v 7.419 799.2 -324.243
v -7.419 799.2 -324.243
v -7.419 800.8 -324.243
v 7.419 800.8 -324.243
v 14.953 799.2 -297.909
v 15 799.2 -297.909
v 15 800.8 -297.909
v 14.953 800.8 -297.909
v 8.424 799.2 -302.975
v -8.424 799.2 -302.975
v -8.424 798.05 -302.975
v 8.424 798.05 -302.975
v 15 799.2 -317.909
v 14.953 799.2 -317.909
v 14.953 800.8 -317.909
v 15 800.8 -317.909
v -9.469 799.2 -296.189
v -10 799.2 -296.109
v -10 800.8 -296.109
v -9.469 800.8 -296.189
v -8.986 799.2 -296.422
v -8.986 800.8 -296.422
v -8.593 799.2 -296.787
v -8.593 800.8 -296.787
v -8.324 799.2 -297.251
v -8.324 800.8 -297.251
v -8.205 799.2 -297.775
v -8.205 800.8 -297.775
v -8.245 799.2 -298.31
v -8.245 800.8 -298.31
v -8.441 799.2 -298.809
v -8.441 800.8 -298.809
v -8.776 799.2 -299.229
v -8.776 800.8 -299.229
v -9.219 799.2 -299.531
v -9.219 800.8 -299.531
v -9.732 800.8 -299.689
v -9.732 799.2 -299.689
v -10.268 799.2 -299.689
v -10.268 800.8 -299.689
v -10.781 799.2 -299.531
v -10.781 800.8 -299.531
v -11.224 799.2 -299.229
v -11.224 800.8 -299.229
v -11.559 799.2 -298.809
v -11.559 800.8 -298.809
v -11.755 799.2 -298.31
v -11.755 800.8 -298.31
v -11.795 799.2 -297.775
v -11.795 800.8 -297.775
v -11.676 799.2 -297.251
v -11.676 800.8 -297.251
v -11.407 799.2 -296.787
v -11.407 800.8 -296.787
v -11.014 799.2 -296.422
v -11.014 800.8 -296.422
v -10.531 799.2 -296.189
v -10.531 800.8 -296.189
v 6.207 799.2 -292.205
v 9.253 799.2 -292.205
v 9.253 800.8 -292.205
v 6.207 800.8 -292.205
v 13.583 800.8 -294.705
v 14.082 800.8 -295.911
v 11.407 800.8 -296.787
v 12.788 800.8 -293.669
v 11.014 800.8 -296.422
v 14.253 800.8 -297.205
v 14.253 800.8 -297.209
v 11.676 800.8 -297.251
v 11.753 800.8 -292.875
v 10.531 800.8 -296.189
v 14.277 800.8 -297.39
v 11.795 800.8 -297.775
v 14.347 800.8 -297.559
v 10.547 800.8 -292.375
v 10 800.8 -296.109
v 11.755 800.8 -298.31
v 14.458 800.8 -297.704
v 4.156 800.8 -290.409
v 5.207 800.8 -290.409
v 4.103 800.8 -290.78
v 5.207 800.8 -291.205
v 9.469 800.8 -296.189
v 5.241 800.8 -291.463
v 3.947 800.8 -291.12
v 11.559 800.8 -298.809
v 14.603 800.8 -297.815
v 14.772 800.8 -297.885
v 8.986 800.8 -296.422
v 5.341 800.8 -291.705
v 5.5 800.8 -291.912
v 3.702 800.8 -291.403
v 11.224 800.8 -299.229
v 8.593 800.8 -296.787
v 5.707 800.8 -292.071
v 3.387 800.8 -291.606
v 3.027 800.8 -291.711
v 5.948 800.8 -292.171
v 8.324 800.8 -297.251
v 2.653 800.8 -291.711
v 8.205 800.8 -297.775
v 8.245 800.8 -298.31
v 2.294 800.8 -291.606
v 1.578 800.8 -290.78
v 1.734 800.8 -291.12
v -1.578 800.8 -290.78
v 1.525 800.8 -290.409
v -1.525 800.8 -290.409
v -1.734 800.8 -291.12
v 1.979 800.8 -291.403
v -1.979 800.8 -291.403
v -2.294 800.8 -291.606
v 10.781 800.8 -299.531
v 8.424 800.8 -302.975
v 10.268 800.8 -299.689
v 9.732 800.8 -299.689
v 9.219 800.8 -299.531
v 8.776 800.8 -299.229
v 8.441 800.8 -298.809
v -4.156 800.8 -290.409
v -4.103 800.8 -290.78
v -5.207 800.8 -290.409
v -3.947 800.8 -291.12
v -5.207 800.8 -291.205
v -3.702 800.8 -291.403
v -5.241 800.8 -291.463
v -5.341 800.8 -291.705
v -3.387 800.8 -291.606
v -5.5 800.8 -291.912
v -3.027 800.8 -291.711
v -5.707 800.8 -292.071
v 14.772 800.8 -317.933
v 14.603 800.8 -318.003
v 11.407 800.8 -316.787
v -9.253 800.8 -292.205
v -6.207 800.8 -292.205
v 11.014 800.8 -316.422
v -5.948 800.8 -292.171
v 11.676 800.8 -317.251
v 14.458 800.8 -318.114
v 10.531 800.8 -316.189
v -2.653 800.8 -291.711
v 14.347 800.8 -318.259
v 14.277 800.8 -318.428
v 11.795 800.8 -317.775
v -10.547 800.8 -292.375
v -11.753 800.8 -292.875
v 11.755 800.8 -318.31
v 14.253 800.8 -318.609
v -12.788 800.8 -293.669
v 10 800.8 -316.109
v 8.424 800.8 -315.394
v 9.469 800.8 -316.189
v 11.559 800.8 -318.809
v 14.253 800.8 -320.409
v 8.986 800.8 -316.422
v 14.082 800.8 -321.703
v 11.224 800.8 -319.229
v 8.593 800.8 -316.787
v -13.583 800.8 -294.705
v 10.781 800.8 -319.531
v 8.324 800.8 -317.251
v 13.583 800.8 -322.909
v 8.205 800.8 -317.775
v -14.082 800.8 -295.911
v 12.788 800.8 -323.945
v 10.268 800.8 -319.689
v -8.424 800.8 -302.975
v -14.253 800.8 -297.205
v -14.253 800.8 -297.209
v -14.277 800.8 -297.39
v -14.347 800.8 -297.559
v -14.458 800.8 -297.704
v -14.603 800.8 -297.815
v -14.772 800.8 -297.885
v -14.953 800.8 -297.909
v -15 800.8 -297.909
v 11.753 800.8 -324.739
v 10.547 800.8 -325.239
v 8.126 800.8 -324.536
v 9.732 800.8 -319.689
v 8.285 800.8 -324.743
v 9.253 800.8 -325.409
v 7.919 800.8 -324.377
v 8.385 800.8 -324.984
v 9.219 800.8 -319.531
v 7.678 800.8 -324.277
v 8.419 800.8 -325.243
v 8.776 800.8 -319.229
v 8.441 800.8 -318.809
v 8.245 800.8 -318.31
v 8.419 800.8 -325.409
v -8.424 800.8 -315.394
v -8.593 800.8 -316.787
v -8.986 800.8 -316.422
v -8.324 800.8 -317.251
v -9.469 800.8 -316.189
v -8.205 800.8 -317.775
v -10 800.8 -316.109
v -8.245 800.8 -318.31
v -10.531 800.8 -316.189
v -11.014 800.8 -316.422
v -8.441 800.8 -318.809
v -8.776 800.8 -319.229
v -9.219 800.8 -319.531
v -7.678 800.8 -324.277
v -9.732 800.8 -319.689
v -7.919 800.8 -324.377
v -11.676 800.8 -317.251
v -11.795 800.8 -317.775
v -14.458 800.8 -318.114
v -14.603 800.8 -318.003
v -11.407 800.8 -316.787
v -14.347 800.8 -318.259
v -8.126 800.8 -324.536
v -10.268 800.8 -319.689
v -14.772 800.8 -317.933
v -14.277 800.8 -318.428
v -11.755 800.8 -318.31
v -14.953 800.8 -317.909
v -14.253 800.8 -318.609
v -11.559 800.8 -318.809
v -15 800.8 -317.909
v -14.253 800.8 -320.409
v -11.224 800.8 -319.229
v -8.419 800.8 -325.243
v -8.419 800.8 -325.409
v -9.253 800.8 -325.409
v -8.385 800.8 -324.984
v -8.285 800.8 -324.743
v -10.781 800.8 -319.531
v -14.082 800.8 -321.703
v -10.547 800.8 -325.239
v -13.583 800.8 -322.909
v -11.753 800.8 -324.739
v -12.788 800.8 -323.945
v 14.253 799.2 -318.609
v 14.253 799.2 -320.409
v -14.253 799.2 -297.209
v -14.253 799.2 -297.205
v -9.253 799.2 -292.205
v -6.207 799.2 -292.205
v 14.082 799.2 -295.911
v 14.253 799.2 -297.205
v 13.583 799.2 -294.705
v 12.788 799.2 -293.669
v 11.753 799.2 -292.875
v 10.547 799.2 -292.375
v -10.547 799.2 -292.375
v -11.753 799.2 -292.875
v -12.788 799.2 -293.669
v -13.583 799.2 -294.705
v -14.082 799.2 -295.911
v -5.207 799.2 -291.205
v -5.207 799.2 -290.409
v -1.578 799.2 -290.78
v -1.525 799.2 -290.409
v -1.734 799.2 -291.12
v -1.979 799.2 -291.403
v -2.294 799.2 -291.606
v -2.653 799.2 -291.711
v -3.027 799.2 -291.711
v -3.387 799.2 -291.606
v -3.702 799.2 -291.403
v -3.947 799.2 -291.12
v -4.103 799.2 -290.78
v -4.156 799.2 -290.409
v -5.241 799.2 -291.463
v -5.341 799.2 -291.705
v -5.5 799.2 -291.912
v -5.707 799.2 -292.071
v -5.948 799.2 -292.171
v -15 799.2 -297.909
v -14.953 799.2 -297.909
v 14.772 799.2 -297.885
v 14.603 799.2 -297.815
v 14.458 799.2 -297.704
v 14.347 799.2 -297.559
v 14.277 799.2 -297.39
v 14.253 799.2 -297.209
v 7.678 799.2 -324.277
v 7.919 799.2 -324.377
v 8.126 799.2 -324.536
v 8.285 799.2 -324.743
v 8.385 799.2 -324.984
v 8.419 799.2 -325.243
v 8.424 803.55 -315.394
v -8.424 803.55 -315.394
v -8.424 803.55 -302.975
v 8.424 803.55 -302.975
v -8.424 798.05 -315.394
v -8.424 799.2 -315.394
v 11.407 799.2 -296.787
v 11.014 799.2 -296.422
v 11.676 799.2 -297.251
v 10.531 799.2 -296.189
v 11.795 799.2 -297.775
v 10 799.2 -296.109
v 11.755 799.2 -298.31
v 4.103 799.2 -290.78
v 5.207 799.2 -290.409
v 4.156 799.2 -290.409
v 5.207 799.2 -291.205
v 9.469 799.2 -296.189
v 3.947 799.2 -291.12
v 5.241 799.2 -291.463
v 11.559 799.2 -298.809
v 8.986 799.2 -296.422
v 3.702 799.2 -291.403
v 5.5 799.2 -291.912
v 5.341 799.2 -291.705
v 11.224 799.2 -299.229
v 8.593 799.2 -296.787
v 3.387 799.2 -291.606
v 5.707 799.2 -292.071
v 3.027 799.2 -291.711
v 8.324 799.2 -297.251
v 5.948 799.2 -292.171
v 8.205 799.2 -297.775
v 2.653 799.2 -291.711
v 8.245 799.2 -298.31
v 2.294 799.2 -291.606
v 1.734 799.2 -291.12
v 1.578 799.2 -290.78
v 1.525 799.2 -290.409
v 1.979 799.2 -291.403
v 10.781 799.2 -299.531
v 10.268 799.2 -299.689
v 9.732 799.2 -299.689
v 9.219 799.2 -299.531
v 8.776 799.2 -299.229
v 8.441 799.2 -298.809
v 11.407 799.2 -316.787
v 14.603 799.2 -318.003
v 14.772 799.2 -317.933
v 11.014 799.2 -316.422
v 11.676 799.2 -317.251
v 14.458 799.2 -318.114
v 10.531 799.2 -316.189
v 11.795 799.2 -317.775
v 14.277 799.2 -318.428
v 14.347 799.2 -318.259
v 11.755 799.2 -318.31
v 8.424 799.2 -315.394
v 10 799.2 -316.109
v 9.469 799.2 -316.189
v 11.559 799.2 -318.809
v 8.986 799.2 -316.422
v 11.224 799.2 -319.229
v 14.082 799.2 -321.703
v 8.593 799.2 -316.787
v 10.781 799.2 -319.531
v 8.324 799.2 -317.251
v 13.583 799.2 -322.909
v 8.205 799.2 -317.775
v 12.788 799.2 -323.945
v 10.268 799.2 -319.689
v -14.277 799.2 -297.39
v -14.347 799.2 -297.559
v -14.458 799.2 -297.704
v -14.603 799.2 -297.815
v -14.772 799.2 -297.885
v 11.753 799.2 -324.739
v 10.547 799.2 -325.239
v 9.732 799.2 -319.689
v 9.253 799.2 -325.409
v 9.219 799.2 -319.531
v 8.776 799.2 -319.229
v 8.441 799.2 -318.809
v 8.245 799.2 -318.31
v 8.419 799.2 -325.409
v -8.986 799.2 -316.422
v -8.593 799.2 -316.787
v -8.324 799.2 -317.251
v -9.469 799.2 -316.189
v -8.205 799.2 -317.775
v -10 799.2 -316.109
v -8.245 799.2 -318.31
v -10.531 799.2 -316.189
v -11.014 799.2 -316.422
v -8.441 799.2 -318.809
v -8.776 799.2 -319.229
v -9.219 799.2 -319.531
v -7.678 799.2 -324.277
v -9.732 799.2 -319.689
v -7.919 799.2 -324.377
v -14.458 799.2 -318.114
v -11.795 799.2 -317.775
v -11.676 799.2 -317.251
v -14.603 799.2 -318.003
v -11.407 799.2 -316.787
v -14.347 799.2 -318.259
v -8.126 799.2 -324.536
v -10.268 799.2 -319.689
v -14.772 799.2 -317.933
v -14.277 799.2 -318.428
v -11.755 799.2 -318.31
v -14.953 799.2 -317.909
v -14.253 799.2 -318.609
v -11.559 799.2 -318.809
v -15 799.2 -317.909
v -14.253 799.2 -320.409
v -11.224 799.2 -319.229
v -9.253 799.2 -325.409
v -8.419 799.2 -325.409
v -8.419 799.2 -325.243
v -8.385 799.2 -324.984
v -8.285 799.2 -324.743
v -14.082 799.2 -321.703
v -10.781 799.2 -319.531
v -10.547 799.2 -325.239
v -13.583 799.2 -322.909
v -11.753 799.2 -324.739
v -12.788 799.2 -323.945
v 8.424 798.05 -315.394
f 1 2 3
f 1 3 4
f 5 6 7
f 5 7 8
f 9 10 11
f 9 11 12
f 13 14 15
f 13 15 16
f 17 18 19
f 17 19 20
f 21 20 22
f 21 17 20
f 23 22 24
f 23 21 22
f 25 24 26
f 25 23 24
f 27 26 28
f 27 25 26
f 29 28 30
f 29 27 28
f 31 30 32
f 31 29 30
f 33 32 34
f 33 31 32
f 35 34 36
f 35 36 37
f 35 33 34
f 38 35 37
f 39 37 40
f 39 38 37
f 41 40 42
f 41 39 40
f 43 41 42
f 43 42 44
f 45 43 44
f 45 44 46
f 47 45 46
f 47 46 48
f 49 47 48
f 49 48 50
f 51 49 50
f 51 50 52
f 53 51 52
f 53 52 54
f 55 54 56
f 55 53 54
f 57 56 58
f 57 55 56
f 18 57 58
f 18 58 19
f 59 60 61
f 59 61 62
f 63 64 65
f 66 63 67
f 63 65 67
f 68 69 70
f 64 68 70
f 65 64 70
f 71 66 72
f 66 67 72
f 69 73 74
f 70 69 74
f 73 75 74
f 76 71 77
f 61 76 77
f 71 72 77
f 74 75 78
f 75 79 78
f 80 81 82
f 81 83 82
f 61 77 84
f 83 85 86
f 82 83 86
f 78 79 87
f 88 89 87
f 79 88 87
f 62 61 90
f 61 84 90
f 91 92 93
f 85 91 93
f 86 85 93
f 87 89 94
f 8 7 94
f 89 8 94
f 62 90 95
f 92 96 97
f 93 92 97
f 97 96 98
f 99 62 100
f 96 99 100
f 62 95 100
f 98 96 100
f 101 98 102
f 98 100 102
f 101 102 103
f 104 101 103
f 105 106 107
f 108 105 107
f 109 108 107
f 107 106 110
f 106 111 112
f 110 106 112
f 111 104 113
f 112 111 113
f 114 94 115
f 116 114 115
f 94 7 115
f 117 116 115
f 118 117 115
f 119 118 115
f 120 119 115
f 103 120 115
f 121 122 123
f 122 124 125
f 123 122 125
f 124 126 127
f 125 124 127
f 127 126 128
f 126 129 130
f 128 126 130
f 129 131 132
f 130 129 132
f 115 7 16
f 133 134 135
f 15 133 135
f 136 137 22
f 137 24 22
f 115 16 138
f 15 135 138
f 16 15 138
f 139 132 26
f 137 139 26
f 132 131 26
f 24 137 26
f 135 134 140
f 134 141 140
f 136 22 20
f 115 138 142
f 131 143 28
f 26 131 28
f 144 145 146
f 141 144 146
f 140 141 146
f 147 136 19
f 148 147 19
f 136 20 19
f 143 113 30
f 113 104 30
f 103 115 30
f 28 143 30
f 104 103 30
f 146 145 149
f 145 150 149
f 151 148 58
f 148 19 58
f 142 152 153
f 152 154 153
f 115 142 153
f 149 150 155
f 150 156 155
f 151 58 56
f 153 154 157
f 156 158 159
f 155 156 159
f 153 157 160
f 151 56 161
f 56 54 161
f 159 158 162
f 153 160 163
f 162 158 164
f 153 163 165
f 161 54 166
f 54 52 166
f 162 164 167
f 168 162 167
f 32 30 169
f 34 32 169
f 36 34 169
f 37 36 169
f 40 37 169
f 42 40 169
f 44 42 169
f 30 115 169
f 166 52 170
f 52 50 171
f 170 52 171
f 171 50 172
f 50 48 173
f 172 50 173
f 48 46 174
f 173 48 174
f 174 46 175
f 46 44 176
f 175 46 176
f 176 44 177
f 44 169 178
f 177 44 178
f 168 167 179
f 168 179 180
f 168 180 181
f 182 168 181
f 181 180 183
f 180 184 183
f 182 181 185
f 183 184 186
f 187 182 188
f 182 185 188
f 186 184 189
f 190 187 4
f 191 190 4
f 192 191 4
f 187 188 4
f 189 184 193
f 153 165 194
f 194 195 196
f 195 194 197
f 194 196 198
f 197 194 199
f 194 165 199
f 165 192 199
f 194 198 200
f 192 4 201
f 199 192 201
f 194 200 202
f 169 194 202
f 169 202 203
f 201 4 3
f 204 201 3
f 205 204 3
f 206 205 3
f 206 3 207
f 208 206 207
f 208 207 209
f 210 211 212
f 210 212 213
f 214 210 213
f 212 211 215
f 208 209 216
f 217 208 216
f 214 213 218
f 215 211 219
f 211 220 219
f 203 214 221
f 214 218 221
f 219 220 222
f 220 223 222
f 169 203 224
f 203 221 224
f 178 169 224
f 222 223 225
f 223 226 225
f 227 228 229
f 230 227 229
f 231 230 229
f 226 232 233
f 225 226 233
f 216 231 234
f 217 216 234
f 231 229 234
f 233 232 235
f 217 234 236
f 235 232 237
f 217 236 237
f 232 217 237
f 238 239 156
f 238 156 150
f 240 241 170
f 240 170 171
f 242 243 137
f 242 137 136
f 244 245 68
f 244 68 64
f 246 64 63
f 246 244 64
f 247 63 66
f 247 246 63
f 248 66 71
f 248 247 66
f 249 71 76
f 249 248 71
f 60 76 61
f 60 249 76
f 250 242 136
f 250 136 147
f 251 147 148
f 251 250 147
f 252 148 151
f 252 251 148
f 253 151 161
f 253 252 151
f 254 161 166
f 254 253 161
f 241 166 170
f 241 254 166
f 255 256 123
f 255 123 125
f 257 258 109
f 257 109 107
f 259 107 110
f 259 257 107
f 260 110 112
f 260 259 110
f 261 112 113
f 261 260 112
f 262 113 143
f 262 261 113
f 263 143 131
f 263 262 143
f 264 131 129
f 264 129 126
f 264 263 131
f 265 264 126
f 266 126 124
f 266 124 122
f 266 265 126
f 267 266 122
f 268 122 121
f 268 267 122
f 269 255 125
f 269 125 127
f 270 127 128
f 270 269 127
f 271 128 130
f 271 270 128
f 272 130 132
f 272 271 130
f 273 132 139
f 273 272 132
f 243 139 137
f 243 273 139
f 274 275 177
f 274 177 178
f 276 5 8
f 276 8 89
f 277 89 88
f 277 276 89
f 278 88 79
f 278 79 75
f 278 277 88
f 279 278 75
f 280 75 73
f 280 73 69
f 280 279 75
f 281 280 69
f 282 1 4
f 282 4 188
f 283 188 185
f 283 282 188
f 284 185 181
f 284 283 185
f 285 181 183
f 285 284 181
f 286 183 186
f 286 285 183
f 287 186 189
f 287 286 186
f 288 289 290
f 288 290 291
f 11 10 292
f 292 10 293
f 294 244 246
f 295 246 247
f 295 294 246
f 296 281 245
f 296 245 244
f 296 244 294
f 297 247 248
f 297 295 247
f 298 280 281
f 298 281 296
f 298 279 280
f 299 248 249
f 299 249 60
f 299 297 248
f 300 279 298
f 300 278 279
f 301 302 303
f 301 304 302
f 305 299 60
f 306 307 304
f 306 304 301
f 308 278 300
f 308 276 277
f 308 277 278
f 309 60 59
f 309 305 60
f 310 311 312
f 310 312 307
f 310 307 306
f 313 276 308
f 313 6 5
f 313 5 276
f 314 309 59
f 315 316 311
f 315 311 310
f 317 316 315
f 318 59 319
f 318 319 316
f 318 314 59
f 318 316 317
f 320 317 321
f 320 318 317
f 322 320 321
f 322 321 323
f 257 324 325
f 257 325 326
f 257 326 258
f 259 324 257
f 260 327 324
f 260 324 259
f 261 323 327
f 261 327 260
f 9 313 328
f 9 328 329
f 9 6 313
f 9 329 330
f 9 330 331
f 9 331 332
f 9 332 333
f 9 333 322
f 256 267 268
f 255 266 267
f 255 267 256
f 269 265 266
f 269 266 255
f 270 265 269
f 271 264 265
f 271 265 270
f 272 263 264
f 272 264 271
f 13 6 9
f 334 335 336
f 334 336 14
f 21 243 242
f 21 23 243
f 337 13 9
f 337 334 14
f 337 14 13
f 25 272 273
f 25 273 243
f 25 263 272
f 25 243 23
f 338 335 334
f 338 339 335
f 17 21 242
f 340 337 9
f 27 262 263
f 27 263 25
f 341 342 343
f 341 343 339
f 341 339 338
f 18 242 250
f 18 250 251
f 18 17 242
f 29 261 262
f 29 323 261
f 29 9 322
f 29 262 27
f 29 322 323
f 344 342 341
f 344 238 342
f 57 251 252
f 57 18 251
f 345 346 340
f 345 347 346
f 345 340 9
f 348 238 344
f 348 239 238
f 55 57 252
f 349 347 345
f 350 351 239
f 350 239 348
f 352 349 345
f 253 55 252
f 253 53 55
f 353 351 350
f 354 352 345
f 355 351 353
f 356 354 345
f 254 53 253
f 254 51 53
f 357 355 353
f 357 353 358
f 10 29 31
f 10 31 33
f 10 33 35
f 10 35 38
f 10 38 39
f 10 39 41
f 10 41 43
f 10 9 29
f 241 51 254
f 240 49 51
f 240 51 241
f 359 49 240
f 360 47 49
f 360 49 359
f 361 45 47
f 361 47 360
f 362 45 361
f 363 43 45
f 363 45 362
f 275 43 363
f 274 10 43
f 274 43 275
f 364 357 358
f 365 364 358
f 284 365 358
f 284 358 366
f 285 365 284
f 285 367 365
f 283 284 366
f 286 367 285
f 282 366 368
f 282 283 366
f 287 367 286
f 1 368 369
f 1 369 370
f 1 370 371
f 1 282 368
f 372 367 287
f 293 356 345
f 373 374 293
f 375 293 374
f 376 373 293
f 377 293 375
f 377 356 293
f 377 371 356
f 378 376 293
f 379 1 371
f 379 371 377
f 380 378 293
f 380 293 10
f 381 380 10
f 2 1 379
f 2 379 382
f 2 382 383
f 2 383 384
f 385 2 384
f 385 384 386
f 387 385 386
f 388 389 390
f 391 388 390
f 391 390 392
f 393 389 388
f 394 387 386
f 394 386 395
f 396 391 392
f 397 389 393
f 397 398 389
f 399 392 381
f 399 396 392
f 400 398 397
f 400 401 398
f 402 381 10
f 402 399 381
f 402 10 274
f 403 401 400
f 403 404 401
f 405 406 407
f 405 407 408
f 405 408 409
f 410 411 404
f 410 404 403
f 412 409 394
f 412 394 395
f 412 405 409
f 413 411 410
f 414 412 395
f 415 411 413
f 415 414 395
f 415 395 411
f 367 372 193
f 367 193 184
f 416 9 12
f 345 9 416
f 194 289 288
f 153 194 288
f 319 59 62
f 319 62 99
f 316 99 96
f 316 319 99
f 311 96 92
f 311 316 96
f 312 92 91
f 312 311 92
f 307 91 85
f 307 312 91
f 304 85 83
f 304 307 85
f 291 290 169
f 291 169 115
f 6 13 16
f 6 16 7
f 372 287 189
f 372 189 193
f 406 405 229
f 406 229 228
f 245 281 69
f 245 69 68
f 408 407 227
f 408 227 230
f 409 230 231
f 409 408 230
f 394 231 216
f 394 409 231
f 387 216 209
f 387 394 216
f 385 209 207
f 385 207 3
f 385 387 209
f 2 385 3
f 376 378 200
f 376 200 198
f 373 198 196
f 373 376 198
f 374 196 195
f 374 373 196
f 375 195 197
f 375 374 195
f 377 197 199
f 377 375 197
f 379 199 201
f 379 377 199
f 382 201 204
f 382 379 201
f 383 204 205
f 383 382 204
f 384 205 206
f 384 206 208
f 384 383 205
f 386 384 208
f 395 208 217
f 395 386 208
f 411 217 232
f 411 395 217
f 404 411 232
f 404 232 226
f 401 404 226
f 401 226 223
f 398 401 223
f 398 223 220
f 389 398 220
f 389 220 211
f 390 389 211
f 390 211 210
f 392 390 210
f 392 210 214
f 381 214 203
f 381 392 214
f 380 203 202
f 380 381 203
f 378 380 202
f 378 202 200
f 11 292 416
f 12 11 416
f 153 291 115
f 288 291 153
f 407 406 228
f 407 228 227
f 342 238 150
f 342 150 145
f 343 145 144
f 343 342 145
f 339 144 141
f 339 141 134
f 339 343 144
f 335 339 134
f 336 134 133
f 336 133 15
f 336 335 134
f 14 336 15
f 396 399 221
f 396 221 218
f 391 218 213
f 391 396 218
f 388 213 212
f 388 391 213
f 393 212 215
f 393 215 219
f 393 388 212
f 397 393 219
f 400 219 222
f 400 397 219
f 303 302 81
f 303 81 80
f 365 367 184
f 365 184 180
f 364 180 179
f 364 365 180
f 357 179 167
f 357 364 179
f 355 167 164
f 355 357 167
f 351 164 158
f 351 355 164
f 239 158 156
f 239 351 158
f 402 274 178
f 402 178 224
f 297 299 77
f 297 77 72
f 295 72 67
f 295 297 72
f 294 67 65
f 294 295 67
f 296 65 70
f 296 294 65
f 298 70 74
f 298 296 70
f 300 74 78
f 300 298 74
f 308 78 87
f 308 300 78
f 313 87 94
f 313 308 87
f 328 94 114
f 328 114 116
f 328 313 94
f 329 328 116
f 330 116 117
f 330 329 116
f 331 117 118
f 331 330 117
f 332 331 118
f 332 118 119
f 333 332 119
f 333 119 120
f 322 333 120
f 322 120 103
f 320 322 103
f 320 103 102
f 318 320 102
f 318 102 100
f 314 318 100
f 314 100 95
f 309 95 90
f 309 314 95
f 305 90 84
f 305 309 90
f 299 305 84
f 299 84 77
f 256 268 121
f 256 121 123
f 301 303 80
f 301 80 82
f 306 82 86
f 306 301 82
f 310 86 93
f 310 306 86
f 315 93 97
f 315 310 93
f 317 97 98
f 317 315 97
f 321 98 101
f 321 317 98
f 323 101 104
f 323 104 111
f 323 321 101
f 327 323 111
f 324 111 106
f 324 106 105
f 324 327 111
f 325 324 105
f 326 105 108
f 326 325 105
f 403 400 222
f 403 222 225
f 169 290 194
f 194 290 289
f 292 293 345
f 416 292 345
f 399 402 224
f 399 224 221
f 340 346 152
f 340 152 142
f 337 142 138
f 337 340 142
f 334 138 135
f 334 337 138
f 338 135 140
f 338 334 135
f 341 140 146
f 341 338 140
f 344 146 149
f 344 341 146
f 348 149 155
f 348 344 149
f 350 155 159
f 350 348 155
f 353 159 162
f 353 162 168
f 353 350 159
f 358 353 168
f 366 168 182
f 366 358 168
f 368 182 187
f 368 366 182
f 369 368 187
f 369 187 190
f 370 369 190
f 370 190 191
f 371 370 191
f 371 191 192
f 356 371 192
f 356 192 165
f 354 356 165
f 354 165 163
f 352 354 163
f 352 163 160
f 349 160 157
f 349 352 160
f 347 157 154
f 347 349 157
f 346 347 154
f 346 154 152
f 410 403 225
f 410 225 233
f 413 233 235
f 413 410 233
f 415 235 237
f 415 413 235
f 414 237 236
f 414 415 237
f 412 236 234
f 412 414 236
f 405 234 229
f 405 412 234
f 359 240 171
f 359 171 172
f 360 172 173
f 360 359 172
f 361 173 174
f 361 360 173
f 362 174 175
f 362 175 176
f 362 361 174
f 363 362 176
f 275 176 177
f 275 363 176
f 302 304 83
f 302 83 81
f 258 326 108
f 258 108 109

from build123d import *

# Parameters (mm, degrees)
SKETCH1_R           = 1800
BOSS_EXTRUDE1_DEPTH = 1600
SCALE1_SCALE        = 0.001
SKETCH2_W           = 16.847552216
SKETCH2_H           = 12.419052776
BOSS_EXTRUDE2_DEPTH = 2.75


with BuildPart() as part:
    # Sketch1 → Boss-Extrude1 (new body)
    with BuildSketch(Plane(origin=(0, 0, 0), x_dir=(1, 0, 0), z_dir=(0, 1, 0))):
        with BuildLine():
            Line((5206.912757967, -17500), (4155.788895153, -17500))
            ThreePointArc((4155.788895153, -17500), (2840.267529192, -16184.478634039), (1524.746163231, -17500))
            Line((1524.746163231, -17500), (-1524.746163231, -17500))
            ThreePointArc((-1524.746163231, -17500), (-2840.267529192, -16184.478634039), (-4155.788895153, -17500))
            Line((-4155.788895153, -17500), (-5206.912757967, -17500))
            Line((-5206.912757967, -17500), (-5206.912757967, -16704.41462639))
            ThreePointArc((-5206.912757967, -16704.41462639), (-5499.80597678, -15997.307845203), (-6206.912757967, -15704.41462639))
            Line((-6206.912757967, -15704.41462639), (-9252.786387289, -15704.41462639))
            ThreePointArc((-9252.786387289, -15704.41462639), (-12788.320293222, -14239.948532322), (-14252.786387289, -10704.414626389))
            Line((-14252.786387289, -10704.414626389), (-14252.786387289, -10700))
            ThreePointArc((-14252.786387289, -10700), (-14457.811640459, -10205.025253169), (-14952.786387289, -10000))
            Line((-14952.786387289, -10000), (-15000, -10000))
            Line((-15000, -10000), (-15000, 10000))
            Line((-15000, 10000), (-14952.786387289, 10000))
            ThreePointArc((-14952.786387289, 10000), (-14457.811640459, 10205.025253169), (-14252.786387289, 10700))
            Line((-14252.786387289, 10700), (-14252.786387289, 12500))
            ThreePointArc((-14252.786387289, 12500), (-12788.320293222, 16035.533905933), (-9252.786387289, 17500))
            Line((-9252.786387289, 17500), (-8419.317674219, 17500))
            Line((-8419.317674219, 17500), (-8419.317674219, 17333.689702781))
            ThreePointArc((-8419.317674219, 17333.689702781), (-8126.424455406, 16626.582921594), (-7419.317674219, 16333.689702781))
            Line((-7419.317674219, 16333.689702781), (7419.317674219, 16333.689702781))
            ThreePointArc((7419.317674219, 16333.689702781), (8126.424455406, 16626.582921594), (8419.31767422, 17333.689702781))
            Line((8419.31767422, 17333.689702781), (8419.31767422, 17500))
            Line((8419.31767422, 17500), (9252.786387289, 17500))
            ThreePointArc((9252.786387289, 17500), (12788.320293222, 16035.533905933), (14252.786387289, 12500))
            Line((14252.786387289, 12500), (14252.786387289, 10700))
            ThreePointArc((14252.786387289, 10700), (14457.811640459, 10205.02525317), (14952.786387289, 10000))
            Line((14952.786387289, 10000), (15000, 10000))
            Line((15000, 10000), (15000, -10000))
            Line((15000, -10000), (14952.786387289, -10000))
            ThreePointArc((14952.786387289, -10000), (14457.811640459, -10205.02525317), (14252.786387289, -10700))
            Line((14252.786387289, -10700), (14252.786387289, -10704.414626389))
            ThreePointArc((14252.786387289, -10704.414626389), (12788.320293222, -14239.948532322), (9252.786387289, -15704.41462639))
            Line((9252.786387289, -15704.41462639), (6206.912757967, -15704.41462639))
            ThreePointArc((6206.912757967, -15704.41462639), (5499.80597678, -15997.307845203), (5206.912757967, -16704.41462639))
            Line((5206.912757967, -16704.41462639), (5206.912757967, -17500))
        make_face()
        with Locations(Location((10000, -10000, 0), (0, 0, 270))):
            Circle(SKETCH1_R, mode=Mode.SUBTRACT)
        with Locations(Location((-10000, -10000, 0), (0, 0, 270))):
            Circle(SKETCH1_R, mode=Mode.SUBTRACT)
        with Locations(Location((-10000, 10000, 0), (0, 0, 270))):
            Circle(SKETCH1_R, mode=Mode.SUBTRACT)
        with Locations(Location((10000, 10000, 0), (0, 0, 270))):
            Circle(SKETCH1_R, mode=Mode.SUBTRACT)
    extrude(amount=BOSS_EXTRUDE1_DEPTH)


with BuildPart() as part_1:
    # Scale1: scaled about (0, 800, -308.21729277)
    add(part.part.scale(SCALE1_SCALE).moved(Location((0, 799.2, -307.909075477))))

    # Sketch2 → Boss-Extrude2 (add, symmetric)
    with BuildSketch(Plane(origin=(0, 800.8, 0), x_dir=(1, 0, 0), z_dir=(0, 1, 0))):
        with Locations((0, 309.184675859)):
            Rectangle(SKETCH2_W, SKETCH2_H)
    extrude(amount=BOSS_EXTRUDE2_DEPTH, both=True)


solid = part_1.part
